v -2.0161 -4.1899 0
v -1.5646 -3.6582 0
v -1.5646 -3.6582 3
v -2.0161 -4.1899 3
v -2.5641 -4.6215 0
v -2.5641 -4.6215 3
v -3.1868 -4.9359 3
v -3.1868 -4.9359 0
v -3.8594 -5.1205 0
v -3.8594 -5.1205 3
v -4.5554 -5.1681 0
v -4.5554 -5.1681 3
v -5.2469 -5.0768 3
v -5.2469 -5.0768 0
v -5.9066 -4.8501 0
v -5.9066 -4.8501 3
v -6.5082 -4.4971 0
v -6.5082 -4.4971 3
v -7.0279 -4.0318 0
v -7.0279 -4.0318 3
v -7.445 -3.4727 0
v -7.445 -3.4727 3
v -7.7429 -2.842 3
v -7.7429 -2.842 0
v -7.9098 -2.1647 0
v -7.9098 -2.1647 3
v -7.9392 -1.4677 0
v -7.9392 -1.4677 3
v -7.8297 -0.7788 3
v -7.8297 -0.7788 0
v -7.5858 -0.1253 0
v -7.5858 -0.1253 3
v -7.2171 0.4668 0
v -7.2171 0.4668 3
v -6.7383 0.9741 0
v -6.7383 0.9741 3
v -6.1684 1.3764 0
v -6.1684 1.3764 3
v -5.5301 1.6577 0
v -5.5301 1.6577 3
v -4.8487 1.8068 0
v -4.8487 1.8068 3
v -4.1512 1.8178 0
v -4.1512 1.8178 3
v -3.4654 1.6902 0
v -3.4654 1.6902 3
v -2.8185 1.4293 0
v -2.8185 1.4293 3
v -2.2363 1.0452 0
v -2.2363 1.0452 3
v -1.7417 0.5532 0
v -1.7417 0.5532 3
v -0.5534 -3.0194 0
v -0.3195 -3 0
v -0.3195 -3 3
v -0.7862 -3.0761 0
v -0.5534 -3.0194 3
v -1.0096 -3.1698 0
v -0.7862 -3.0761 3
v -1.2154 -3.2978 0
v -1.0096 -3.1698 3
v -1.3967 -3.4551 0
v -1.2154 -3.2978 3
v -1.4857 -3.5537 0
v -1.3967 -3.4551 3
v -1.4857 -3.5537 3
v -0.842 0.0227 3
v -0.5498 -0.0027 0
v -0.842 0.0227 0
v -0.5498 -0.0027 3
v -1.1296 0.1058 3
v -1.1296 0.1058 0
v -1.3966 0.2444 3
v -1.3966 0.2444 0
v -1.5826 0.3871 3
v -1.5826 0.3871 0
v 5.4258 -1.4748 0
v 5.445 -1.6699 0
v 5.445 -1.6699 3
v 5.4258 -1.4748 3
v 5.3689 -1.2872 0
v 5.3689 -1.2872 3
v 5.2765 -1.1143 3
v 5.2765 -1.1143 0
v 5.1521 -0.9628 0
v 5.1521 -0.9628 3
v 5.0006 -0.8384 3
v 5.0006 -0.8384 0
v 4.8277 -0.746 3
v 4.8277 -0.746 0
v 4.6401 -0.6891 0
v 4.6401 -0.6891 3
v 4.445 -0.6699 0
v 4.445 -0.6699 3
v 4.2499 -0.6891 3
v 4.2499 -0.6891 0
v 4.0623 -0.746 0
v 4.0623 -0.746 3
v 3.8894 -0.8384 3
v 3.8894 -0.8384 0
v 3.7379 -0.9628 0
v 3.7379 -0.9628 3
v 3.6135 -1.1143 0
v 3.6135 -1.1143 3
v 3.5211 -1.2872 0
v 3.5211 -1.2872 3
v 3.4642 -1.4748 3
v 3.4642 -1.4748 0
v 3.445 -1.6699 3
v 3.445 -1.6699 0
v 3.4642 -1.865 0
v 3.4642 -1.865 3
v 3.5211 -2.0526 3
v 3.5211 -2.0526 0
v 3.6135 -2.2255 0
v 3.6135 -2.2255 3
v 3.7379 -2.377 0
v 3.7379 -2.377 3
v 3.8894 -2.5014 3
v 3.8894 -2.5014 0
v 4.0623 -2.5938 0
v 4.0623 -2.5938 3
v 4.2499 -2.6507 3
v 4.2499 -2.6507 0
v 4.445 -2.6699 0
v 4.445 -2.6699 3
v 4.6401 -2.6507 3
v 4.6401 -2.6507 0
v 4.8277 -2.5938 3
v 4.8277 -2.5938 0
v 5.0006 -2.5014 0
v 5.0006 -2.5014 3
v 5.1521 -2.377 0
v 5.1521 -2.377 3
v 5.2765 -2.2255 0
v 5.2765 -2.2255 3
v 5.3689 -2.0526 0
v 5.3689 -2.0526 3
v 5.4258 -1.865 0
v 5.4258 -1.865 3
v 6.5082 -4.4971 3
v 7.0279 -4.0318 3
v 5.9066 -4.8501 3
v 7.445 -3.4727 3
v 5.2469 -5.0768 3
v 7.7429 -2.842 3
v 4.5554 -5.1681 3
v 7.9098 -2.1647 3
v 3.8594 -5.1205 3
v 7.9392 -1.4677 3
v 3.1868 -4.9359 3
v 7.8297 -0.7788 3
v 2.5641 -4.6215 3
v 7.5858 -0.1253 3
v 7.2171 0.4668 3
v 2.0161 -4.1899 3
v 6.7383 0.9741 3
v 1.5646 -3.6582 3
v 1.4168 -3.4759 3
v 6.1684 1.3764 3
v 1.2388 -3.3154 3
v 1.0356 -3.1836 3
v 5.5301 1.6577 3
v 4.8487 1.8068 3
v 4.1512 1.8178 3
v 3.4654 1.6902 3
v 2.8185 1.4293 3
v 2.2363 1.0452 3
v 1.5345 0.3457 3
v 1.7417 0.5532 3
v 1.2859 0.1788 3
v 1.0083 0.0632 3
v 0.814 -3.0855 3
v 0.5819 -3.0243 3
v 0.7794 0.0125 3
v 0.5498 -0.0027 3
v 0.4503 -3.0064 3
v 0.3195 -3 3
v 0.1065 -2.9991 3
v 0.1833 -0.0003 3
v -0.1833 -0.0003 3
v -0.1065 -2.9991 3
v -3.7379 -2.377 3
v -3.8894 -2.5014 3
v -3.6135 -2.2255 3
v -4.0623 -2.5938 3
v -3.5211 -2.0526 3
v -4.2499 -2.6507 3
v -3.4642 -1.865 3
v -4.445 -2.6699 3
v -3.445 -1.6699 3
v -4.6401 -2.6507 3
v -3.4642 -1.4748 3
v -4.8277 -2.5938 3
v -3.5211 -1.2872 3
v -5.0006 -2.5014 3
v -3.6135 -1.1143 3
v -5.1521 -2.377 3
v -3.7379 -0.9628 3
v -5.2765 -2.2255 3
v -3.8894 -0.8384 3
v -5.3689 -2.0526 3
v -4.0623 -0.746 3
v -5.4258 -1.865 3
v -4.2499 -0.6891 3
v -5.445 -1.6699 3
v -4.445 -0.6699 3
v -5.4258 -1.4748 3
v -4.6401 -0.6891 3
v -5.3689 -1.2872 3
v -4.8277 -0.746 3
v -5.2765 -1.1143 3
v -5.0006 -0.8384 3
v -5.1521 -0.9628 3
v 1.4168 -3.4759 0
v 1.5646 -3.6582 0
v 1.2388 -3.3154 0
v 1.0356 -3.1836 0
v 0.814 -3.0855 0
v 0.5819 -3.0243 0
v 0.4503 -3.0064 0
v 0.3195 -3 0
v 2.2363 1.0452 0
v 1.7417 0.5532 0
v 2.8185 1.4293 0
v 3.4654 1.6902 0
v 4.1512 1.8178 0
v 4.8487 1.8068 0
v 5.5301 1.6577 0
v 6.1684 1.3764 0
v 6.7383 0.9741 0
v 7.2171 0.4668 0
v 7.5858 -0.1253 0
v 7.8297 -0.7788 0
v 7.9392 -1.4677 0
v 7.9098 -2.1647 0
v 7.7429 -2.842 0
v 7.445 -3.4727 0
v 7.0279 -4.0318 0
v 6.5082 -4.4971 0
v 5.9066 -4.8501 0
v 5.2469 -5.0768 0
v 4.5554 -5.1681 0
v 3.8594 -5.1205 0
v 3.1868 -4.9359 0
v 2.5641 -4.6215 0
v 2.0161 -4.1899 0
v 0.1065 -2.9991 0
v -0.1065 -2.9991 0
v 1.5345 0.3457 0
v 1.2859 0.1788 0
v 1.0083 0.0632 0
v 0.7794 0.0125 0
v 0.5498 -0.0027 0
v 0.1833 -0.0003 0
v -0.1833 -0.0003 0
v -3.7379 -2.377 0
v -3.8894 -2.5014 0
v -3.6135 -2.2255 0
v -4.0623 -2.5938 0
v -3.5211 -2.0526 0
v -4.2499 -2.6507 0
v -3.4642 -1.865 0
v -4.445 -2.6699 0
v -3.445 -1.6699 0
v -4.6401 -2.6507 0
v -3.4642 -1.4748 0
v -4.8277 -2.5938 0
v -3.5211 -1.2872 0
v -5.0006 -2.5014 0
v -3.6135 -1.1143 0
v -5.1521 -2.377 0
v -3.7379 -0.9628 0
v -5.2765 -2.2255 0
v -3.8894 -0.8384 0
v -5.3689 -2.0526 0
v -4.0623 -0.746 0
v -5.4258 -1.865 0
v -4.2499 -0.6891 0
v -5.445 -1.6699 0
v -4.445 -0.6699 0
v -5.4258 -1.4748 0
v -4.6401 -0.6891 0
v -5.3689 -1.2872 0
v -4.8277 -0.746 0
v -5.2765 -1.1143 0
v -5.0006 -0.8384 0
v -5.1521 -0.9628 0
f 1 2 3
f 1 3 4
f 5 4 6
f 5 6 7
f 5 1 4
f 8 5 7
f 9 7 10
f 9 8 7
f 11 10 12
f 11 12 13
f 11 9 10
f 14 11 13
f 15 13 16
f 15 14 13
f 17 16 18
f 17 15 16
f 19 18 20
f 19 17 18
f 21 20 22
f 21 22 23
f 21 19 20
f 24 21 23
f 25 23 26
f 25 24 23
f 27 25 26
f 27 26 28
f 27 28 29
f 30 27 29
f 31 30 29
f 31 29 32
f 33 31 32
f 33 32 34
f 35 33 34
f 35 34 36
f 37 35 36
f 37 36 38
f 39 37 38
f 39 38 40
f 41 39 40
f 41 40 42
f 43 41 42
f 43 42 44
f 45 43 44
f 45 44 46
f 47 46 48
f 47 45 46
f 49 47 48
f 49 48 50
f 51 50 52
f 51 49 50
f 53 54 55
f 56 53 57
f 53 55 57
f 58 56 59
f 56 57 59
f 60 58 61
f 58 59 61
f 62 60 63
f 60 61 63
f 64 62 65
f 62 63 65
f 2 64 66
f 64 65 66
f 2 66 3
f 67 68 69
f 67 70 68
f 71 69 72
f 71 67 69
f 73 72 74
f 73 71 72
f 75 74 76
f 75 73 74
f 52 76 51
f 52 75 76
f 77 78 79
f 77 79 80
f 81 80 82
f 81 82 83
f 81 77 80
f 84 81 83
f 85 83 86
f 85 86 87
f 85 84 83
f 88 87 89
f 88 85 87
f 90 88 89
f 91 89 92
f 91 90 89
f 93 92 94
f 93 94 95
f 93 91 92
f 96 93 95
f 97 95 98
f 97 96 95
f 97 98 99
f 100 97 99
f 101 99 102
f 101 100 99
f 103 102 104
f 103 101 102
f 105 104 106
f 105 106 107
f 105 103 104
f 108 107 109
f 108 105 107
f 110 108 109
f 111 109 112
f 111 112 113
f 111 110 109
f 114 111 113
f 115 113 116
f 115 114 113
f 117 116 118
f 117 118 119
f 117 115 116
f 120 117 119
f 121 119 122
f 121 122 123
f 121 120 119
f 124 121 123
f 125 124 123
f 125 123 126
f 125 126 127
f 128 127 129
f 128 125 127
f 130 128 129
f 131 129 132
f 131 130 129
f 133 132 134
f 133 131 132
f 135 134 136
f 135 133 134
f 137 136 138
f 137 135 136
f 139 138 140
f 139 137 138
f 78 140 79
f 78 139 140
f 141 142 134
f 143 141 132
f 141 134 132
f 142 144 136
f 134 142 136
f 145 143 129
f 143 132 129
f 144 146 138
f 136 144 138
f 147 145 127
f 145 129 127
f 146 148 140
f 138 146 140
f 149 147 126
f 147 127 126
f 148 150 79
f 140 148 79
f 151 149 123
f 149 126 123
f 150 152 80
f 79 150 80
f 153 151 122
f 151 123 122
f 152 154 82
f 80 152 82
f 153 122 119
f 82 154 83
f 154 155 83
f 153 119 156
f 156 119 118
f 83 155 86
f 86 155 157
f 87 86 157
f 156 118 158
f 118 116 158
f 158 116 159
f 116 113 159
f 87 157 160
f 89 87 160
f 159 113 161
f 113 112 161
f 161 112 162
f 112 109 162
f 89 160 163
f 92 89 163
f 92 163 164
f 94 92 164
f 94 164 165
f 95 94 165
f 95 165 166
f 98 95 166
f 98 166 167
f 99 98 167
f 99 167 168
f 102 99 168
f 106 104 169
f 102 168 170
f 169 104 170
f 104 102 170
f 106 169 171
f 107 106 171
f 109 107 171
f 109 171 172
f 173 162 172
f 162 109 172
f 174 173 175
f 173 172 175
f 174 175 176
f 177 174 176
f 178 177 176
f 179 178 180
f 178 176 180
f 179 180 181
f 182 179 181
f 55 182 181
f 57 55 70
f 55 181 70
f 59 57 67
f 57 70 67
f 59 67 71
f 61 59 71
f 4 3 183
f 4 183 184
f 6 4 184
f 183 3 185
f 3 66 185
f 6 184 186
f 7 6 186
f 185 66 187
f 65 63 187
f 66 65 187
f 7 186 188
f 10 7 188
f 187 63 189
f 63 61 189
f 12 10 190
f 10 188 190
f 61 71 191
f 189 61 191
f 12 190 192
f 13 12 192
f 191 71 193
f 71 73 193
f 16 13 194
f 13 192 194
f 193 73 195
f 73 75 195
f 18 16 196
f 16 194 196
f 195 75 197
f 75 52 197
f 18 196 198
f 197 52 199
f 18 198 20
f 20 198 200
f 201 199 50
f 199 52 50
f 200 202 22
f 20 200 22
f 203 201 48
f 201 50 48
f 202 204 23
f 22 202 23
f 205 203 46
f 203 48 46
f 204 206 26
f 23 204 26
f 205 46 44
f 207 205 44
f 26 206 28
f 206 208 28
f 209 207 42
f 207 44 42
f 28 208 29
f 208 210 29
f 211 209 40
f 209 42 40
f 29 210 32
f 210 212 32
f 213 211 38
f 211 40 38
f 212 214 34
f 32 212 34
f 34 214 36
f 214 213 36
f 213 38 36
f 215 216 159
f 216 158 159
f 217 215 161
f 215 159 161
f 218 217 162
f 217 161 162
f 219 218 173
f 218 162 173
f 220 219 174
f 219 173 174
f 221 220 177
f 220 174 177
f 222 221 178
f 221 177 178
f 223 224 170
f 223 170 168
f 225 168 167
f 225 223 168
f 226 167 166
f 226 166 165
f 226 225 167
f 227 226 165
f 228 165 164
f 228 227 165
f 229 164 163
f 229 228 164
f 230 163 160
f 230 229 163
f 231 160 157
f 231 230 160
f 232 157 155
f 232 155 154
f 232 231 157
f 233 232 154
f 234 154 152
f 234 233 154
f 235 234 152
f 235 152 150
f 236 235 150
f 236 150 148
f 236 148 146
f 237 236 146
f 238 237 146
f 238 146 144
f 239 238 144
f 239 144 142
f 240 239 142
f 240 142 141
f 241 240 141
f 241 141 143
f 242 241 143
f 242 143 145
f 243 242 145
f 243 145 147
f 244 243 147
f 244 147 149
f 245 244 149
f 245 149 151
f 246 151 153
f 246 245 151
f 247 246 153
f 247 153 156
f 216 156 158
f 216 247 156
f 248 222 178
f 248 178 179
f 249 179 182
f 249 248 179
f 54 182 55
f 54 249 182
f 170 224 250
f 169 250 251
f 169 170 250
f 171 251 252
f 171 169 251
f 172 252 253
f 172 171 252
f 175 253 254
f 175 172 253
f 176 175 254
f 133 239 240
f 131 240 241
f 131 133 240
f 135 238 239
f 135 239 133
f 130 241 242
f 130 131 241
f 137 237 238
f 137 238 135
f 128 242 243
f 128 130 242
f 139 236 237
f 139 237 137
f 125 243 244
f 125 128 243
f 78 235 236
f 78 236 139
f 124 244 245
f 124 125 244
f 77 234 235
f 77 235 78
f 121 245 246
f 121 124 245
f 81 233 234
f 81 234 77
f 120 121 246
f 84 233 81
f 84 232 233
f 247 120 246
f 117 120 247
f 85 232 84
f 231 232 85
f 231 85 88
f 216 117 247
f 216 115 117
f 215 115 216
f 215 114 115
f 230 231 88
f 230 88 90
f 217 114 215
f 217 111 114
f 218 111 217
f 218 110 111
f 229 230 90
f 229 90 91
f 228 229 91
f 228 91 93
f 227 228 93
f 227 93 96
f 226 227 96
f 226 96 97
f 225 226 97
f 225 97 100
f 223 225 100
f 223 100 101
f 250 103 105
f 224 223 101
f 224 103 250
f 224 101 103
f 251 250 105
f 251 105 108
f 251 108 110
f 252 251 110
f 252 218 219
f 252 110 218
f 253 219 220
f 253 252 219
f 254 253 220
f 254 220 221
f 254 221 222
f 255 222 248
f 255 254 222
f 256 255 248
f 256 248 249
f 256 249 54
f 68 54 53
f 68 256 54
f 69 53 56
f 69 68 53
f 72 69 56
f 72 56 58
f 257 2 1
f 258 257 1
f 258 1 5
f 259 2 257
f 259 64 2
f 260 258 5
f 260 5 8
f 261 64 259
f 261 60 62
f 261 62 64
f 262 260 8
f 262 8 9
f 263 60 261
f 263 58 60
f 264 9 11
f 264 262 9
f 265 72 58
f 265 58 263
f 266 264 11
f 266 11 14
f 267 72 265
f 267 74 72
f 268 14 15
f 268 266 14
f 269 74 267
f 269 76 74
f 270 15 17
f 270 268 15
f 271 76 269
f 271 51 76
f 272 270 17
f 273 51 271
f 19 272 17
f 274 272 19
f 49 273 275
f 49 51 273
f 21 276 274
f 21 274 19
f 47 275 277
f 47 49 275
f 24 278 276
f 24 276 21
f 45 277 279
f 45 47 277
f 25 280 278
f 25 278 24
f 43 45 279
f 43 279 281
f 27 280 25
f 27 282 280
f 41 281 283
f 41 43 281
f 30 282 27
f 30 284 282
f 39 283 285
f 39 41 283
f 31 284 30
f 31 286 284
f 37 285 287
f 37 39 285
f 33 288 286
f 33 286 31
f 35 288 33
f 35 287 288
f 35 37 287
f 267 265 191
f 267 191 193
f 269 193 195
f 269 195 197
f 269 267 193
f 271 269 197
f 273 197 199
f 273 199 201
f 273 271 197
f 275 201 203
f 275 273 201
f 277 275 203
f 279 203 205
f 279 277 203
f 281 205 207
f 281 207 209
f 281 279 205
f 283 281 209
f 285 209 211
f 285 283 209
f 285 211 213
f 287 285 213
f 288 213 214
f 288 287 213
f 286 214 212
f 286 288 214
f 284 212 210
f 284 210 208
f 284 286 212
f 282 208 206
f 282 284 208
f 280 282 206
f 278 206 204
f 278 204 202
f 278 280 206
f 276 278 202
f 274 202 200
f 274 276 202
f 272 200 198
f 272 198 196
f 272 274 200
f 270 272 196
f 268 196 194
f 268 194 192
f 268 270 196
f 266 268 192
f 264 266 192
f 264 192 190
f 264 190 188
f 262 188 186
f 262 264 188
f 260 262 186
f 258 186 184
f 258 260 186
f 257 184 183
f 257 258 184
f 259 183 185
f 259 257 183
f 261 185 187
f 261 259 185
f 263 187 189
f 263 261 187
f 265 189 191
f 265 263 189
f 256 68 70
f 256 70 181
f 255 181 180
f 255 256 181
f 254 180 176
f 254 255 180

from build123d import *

# Parameters (mm, degrees)
SKETCH_1_R      = 1
EXTRUDE_1_DEPTH = 3
FILLET_1_R      = 1.524


with BuildPart() as part:
    # 스케치1 → 보스-돌출1 (new body)
    with BuildSketch(Plane.XY):
        with BuildLine():
            ThreePointArc((1.360201973, -0.016393318), (7.940776925, -1.84176367), (1.212873871, -3.012773539))
            ThreePointArc((1.212873871, -3.012773539), (0, -2.999007865), (-1.212873871, -3.012773539))
            ThreePointArc((-1.212873871, -3.012773539), (-7.940776925, -1.84176367), (-1.360201973, -0.016393318))
            ThreePointArc((-1.360201973, -0.016393318), (0, 0), (1.360201973, -0.016393318))
        make_face()
        with Locations((-4.445, -1.669880884)):
            Circle(SKETCH_1_R, mode=Mode.SUBTRACT)
        with Locations((4.445, -1.669880884)):
            Circle(SKETCH_1_R, mode=Mode.SUBTRACT)
    extrude(amount=EXTRUDE_1_DEPTH)

    # 필렛1
    fillet_1_edges = [part.edges().sort_by_distance(p)[0] for p in [
        (-1.360201973, -0.016393318, 1.5),
        (1.360201973, -0.016393318, 1.5),
        (1.212873871, -3.012773539, 1.5),
        (-1.212873871, -3.012773539, 1.5),
    ]]
    fillet(fillet_1_edges, radius=FILLET_1_R)


solid = part.part
